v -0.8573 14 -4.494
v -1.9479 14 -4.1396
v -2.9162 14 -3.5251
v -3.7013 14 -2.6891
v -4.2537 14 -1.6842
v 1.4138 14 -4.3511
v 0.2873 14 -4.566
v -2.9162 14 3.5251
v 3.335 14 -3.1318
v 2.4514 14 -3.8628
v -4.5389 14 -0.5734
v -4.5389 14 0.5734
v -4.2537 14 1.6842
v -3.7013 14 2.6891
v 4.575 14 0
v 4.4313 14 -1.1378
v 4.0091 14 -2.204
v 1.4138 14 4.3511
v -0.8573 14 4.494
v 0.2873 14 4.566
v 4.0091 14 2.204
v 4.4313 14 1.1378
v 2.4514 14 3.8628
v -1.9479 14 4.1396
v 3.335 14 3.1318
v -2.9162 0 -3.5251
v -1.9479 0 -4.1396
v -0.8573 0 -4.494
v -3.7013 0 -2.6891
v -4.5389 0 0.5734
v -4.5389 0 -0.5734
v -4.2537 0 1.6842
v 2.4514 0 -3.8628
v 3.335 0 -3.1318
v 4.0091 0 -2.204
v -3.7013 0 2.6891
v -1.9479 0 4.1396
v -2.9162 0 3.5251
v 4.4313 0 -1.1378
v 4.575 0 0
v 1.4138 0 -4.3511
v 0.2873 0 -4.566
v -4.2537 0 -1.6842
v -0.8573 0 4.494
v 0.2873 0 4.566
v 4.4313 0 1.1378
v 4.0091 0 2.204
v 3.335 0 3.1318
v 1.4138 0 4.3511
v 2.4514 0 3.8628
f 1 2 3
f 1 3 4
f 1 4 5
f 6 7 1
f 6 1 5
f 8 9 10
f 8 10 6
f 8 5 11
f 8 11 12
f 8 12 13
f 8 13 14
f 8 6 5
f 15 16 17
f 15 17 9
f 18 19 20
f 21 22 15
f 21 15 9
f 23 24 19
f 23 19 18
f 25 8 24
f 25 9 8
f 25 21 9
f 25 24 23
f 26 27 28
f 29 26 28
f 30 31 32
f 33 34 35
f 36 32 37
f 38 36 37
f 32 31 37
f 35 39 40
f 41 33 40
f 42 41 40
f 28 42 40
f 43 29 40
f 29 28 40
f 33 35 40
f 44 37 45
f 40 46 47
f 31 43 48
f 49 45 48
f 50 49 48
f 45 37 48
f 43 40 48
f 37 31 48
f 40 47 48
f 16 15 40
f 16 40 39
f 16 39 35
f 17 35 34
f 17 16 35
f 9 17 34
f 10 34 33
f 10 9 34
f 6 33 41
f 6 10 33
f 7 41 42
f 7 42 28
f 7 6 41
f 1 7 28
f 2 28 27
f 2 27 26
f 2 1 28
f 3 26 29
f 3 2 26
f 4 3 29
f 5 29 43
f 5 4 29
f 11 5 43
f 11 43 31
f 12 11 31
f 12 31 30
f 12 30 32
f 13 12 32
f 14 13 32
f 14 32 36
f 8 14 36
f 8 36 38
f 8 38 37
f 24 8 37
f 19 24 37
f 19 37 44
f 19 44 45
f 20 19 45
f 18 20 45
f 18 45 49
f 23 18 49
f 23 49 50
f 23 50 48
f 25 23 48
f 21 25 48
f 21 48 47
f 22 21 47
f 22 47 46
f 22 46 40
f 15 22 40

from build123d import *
from build123d.topology import SkipClean

# Parameters (mm, degrees)
SKETCH1_R               = 4.65
BOSS_EXTRUDE1_DEPTH     = 12
SKETCH2_R               = 17.5
BOSS_EXTRUDE2_DEPTH     = 2
SKETCH3_W               = 5
SKETCH3_H               = 13
BOSS_EXTRUDE3_DEPTH     = 12
FILLET1_R               = 4
FILLET2_R               = 4
CUT_EXTRUDE1_DEPTH      = 29.434134416
SKETCH5_R               = 2.05
CUT_EXTRUDE2_DEPTH      = 70
FILLET3_R               = 4
SKETCH6_R               = 24.65
SKETCH6_R_2             = 4.65
CUT_EXTRUDE_THIN1_DEPTH = 25.540782384
SKETCH7_R               = 24.575
SKETCH7_R_2             = 4.575
CUT_EXTRUDE_THIN2_DEPTH = 30


with BuildPart() as part:
    # Sketch1 → Boss-Extrude1 (new body)
    with BuildSketch(Plane(origin=(0, 0, 0), x_dir=(1, 0, 0), z_dir=(0, 1, 0))):
        with Locations(Location((0, 0, 0), (0, 0, 270))):
            Circle(SKETCH1_R)
    extrude(amount=BOSS_EXTRUDE1_DEPTH)

    # Sketch2 → Boss-Extrude2 (add)
    with BuildSketch(Plane(origin=(0, 12, 0), x_dir=(1, 0, 0), z_dir=(0, 1, 0))):
        with Locations(Location((0, 0, 0), (0, 0, 270))):
            Circle(SKETCH2_R)
    extrude(amount=BOSS_EXTRUDE2_DEPTH)

    # Sketch3 → Boss-Extrude3 (add)
    with BuildSketch(Plane(origin=(0, 14, 0), x_dir=(1, 0, 0), z_dir=(0, 1, 0))):
        with Locations((7.5, 0)):
            Rectangle(SKETCH3_W, SKETCH3_H)
    boss_extrude3 = extrude(amount=BOSS_EXTRUDE3_DEPTH)

    # Mirror1: Boss-Extrude3 across plane
    add(boss_extrude3.mirror(Plane(origin=(0, 0, 0), x_dir=(0, 0, 1), z_dir=(1, 0, 0))))

    # Fillet1
    fillet1_edges = [part.edges().sort_by_distance(p)[0] for p in [
        (7.5, 26, -6.5),
        (7.5, 26, 6.5),
        (-7.5, 26, 6.5),
        (-7.5, 26, -6.5),
    ]]
    fillet(fillet1_edges, radius=FILLET1_R)

    # Fillet2
    fillet2_edges = [part.edges().sort_by_distance(p)[0] for p in [
        (7.5, 14, 6.5),
        (7.5, 14, -6.5),
        (-7.5, 14, -6.5),
        (-7.5, 14, 6.5),
    ]]
    fillet(fillet2_edges, radius=FILLET2_R)

    # Sketch4 → Cut-Extrude1 (cut, through all)
    with BuildSketch(Plane(origin=(0, 14, 0), x_dir=(1, 0, 0), z_dir=(0, 1, 0))):
        with BuildLine():
            Line((10, 14.361406616), (10, 0))
            Line((10, 0), (10, -14.361406616))
            ThreePointArc((10, -14.361406616), (15.512092057, -8.100925873), (17.5, 0))
            ThreePointArc((17.5, 0), (15.512092057, 8.100925873), (10, 14.361406616))
        make_face()
    cut_extrude1 = extrude(amount=-CUT_EXTRUDE1_DEPTH, mode=Mode.SUBTRACT)

    # Mirror2: Cut-Extrude1 across plane
    add(cut_extrude1.mirror(Plane(origin=(0, 0, 0), x_dir=(0, 0, 1), z_dir=(1, 0, 0))), mode=Mode.SUBTRACT)

    # Sketch5 → Cut-Extrude2 (cut)
    with BuildSketch(Plane(origin=(10, 0, 0), x_dir=(0, 0, -1), z_dir=(1, 0, 0))):
        with Locations((0, 20)):
            Circle(SKETCH5_R)
    extrude(amount=-CUT_EXTRUDE2_DEPTH, mode=Mode.SUBTRACT)

    # Fillet3
    fillet3_edges = [part.edges().sort_by_distance(p)[0] for p in [
        (10, 13, -14.361406616),
        (10, 13, 14.361406616),
        (-10, 13, 14.361406616),
        (-10, 13, -14.361406616),
    ]]
    fillet(fillet3_edges, radius=FILLET3_R)

    # Sketch6 → Cut-Extrude-Thin1 (cut, through all)
    with SkipClean():  # the faces are left unmerged after this step: merging them gives an invalid solid
        with BuildSketch(Plane.XZ.offset(-12)):
            Circle(SKETCH6_R)
            Circle(SKETCH6_R_2, mode=Mode.SUBTRACT)
        extrude(amount=-CUT_EXTRUDE_THIN1_DEPTH, mode=Mode.SUBTRACT)

    # Sketch7 → Cut-Extrude-Thin2 (cut)
    with BuildSketch(Plane(origin=(0, 14, 0), x_dir=(1, 0, 0), z_dir=(0, 1, 0))):
        Circle(SKETCH7_R)
        Circle(SKETCH7_R_2, mode=Mode.SUBTRACT)
    extrude(amount=-CUT_EXTRUDE_THIN2_DEPTH, mode=Mode.SUBTRACT)


solid = part.part
